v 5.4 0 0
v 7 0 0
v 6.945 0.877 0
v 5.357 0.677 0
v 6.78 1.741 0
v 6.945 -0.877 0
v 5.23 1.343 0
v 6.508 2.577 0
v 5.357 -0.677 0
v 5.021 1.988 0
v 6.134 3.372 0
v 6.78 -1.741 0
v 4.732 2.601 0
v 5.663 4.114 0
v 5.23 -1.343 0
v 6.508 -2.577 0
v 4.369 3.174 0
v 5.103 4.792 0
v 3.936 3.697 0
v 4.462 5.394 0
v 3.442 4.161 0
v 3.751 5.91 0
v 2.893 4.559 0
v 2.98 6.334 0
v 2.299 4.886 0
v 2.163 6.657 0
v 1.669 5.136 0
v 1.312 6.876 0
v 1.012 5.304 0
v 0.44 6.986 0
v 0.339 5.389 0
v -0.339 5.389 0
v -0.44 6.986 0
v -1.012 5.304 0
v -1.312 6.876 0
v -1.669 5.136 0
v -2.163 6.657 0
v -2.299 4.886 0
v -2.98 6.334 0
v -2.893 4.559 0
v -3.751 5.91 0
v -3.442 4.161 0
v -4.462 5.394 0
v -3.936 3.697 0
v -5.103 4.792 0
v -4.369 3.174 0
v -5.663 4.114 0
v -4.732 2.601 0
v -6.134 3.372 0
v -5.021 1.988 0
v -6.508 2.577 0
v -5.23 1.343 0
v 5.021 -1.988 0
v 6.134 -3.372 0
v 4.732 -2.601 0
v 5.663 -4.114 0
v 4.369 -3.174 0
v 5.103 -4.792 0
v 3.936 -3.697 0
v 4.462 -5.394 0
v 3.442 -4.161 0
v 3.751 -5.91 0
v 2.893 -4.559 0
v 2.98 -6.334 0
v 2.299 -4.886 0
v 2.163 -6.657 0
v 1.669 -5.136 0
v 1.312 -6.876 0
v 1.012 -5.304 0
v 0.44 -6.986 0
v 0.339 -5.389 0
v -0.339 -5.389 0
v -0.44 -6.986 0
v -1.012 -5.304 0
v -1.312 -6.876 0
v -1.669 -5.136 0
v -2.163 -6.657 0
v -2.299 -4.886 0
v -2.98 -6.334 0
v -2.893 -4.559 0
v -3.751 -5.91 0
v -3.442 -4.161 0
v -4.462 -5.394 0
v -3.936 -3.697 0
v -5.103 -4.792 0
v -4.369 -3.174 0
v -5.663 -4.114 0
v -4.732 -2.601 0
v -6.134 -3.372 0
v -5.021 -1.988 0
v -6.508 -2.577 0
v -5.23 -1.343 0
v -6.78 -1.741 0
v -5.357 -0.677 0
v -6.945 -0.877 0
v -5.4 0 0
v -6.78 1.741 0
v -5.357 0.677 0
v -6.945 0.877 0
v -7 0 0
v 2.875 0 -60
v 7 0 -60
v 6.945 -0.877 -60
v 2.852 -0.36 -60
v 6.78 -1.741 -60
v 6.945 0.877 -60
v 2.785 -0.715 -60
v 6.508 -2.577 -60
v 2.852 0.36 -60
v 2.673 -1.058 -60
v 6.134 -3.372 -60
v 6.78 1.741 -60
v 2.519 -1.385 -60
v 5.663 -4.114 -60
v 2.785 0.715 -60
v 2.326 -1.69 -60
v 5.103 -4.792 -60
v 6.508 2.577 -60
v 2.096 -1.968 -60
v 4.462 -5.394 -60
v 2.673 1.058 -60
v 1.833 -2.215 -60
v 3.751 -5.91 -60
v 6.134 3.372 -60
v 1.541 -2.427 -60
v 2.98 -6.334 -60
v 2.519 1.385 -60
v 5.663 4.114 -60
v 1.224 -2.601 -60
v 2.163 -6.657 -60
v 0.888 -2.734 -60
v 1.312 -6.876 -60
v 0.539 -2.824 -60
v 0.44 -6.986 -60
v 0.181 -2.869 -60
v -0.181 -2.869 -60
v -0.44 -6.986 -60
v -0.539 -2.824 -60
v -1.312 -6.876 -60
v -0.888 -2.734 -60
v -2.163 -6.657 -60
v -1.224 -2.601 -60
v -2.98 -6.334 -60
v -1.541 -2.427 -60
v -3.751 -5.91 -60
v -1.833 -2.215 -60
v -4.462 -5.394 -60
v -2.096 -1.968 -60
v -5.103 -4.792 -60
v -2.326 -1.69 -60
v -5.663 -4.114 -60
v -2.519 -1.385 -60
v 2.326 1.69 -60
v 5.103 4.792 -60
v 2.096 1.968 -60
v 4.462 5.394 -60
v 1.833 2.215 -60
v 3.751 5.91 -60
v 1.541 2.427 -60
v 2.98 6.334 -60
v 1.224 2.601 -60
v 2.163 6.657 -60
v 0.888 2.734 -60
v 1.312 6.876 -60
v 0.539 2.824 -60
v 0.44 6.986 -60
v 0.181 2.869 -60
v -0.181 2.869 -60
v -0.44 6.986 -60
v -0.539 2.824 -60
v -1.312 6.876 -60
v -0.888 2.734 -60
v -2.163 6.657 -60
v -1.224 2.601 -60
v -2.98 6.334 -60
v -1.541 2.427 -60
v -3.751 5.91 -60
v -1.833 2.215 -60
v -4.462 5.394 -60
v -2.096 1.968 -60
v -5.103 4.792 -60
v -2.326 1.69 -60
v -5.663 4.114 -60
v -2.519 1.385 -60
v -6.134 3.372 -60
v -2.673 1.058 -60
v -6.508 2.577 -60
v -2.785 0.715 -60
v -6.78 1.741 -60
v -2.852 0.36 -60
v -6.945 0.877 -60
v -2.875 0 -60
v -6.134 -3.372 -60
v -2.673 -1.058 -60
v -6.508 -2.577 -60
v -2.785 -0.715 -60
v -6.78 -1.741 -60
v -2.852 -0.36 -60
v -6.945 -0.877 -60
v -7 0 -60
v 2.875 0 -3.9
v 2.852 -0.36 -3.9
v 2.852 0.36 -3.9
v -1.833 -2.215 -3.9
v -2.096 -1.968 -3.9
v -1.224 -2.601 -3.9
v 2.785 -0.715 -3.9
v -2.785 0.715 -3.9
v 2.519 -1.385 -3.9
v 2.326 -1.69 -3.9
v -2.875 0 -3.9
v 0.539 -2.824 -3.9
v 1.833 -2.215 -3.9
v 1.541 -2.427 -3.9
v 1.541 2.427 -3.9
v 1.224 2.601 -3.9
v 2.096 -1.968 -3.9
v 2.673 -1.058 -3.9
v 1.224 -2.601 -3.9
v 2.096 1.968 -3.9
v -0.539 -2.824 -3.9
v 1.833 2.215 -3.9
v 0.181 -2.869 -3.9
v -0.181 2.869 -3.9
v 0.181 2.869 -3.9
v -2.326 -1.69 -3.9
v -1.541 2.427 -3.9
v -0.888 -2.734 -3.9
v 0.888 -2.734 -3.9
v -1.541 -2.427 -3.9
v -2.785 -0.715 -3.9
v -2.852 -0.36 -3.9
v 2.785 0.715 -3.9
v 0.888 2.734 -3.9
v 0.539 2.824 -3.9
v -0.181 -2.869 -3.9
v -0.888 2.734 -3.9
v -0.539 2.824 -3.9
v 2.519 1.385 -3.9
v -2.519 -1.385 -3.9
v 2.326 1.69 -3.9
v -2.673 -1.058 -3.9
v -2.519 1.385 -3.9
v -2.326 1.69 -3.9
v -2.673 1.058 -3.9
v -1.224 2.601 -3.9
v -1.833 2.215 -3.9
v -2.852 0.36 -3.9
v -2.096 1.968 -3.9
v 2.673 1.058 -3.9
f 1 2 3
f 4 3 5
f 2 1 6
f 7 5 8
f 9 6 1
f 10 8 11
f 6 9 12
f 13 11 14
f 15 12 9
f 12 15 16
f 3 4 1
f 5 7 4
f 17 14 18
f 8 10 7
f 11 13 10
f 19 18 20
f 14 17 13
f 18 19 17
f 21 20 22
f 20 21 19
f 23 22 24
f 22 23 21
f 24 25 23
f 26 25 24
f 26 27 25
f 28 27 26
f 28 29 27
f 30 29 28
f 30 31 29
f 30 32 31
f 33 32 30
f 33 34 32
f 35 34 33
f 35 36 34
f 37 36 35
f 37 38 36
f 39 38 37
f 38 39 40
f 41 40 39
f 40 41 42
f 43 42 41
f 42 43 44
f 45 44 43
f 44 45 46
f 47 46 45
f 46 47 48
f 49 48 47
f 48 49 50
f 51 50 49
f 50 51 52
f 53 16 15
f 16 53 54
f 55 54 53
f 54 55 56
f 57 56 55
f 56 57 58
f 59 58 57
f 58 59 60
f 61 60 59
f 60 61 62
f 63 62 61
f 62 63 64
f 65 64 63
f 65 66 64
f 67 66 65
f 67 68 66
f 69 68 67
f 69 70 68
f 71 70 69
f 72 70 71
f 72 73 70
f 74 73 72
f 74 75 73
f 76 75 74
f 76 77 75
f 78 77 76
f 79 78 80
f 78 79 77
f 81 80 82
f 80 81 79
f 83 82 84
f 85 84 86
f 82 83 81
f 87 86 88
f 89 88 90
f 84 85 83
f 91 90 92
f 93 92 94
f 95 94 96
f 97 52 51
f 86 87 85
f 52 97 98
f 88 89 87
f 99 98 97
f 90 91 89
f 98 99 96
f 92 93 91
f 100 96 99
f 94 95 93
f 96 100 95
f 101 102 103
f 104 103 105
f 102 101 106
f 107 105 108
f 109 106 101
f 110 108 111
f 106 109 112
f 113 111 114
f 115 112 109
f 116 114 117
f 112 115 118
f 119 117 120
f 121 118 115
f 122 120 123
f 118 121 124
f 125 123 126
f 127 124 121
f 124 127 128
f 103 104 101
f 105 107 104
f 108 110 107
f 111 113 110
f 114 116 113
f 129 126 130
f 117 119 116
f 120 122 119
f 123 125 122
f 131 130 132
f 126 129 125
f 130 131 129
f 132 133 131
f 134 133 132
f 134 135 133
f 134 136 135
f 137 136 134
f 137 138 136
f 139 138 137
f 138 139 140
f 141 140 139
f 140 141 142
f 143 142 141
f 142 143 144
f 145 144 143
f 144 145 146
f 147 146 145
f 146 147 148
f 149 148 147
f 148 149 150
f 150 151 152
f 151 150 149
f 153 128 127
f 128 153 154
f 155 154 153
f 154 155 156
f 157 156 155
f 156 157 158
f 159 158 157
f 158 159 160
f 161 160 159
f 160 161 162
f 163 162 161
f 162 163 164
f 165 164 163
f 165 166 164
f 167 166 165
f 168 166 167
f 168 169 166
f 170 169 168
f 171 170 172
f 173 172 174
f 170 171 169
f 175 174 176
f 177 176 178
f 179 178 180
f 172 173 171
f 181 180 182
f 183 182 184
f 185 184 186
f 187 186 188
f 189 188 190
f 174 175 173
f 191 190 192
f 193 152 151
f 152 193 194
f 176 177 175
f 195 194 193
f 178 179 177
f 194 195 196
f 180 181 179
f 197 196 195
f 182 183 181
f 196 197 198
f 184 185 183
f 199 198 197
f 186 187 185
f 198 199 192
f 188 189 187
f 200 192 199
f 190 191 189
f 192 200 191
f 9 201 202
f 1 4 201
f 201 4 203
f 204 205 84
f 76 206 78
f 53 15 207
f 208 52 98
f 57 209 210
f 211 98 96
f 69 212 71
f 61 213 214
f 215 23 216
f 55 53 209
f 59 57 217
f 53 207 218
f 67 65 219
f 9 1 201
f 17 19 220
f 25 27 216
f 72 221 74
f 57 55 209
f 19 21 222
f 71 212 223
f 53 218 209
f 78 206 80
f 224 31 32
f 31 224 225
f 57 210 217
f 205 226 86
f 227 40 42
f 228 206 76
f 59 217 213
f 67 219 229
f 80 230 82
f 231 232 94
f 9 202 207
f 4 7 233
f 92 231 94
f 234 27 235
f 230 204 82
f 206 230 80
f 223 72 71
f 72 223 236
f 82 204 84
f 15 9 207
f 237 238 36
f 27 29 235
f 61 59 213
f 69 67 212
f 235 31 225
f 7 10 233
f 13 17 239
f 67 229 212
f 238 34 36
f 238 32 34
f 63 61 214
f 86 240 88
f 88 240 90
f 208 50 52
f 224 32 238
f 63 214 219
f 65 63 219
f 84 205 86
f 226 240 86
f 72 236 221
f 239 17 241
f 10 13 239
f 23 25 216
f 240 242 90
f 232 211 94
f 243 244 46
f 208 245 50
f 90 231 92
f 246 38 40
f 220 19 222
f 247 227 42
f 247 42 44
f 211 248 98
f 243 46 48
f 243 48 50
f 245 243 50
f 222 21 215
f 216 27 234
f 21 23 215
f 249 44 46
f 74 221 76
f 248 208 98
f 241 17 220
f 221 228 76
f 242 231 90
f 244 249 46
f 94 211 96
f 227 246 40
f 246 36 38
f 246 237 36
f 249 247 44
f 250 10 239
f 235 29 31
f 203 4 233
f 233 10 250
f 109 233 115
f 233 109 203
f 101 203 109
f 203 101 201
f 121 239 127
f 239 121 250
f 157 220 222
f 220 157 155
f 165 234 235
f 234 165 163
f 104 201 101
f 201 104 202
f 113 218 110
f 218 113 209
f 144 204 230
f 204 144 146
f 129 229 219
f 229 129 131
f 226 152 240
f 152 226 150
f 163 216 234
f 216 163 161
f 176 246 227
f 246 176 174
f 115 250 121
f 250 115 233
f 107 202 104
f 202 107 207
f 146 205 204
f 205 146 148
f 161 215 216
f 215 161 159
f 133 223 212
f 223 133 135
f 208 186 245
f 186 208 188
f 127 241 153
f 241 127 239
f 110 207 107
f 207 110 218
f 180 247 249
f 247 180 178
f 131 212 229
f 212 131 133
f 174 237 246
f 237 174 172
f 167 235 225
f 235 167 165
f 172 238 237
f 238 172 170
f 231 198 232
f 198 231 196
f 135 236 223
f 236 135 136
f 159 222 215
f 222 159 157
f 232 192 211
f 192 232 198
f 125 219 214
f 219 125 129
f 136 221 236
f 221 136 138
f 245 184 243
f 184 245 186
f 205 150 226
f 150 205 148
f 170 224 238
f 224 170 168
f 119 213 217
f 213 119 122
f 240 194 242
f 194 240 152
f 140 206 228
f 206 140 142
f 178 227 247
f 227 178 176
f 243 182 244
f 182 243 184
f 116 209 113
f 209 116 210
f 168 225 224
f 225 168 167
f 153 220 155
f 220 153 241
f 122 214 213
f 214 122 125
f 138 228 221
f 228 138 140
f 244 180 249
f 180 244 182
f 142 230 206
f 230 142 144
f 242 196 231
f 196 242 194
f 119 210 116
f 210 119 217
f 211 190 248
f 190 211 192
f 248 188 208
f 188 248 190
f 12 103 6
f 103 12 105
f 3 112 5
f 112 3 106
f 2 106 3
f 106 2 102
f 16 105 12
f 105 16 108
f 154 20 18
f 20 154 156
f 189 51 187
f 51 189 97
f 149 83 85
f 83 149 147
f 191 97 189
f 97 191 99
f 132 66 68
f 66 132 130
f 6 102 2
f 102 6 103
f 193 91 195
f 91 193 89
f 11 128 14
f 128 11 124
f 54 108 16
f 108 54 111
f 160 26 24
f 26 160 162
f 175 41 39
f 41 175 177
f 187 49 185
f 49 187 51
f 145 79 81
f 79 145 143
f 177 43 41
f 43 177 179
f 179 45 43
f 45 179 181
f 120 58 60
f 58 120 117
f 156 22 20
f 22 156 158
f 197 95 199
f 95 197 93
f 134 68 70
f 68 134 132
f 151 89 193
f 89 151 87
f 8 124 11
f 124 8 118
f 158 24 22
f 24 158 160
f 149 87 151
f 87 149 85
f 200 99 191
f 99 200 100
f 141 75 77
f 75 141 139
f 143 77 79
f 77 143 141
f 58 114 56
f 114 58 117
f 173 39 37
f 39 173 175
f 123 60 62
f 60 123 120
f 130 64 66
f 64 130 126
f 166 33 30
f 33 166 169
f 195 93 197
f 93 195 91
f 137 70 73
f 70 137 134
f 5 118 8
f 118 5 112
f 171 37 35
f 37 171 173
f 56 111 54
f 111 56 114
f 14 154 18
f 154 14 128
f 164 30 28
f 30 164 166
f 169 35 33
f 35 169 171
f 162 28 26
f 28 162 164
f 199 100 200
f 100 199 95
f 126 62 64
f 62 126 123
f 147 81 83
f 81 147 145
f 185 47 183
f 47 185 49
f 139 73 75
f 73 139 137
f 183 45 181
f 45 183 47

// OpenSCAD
$fn = 50;


difference() {
	union() {
		translate(v = [0, 0, -60.0000000000]) {
			cylinder(h = 60, r = 7.0000000000);
		}
		cylinder(h = 0, r = 10.0000000000);
	}
	union() {
		translate(v = [0, 0, 0]) {
			rotate(a = [0, 0, 0]) {
				difference() {
					union() {
						#translate(v = [0, 0, -60.0000000000]) {
							cylinder(h = 60, r = 2.6000000000);
						}
						#translate(v = [0, 0, -3.9000000000]) {
							cylinder(h = 3.9000000000, r1 = 2.8750000000, r2 = 5.4000000000);
						}
						#translate(v = [0, 0, -60.0000000000]) {
							cylinder(h = 60, r = 2.8750000000);
						}
						#translate(v = [0, 0, -60.0000000000]) {
							cylinder(h = 60, r = 2.6000000000);
						}
					}
					union();
				}
			}
		}
	}
}
